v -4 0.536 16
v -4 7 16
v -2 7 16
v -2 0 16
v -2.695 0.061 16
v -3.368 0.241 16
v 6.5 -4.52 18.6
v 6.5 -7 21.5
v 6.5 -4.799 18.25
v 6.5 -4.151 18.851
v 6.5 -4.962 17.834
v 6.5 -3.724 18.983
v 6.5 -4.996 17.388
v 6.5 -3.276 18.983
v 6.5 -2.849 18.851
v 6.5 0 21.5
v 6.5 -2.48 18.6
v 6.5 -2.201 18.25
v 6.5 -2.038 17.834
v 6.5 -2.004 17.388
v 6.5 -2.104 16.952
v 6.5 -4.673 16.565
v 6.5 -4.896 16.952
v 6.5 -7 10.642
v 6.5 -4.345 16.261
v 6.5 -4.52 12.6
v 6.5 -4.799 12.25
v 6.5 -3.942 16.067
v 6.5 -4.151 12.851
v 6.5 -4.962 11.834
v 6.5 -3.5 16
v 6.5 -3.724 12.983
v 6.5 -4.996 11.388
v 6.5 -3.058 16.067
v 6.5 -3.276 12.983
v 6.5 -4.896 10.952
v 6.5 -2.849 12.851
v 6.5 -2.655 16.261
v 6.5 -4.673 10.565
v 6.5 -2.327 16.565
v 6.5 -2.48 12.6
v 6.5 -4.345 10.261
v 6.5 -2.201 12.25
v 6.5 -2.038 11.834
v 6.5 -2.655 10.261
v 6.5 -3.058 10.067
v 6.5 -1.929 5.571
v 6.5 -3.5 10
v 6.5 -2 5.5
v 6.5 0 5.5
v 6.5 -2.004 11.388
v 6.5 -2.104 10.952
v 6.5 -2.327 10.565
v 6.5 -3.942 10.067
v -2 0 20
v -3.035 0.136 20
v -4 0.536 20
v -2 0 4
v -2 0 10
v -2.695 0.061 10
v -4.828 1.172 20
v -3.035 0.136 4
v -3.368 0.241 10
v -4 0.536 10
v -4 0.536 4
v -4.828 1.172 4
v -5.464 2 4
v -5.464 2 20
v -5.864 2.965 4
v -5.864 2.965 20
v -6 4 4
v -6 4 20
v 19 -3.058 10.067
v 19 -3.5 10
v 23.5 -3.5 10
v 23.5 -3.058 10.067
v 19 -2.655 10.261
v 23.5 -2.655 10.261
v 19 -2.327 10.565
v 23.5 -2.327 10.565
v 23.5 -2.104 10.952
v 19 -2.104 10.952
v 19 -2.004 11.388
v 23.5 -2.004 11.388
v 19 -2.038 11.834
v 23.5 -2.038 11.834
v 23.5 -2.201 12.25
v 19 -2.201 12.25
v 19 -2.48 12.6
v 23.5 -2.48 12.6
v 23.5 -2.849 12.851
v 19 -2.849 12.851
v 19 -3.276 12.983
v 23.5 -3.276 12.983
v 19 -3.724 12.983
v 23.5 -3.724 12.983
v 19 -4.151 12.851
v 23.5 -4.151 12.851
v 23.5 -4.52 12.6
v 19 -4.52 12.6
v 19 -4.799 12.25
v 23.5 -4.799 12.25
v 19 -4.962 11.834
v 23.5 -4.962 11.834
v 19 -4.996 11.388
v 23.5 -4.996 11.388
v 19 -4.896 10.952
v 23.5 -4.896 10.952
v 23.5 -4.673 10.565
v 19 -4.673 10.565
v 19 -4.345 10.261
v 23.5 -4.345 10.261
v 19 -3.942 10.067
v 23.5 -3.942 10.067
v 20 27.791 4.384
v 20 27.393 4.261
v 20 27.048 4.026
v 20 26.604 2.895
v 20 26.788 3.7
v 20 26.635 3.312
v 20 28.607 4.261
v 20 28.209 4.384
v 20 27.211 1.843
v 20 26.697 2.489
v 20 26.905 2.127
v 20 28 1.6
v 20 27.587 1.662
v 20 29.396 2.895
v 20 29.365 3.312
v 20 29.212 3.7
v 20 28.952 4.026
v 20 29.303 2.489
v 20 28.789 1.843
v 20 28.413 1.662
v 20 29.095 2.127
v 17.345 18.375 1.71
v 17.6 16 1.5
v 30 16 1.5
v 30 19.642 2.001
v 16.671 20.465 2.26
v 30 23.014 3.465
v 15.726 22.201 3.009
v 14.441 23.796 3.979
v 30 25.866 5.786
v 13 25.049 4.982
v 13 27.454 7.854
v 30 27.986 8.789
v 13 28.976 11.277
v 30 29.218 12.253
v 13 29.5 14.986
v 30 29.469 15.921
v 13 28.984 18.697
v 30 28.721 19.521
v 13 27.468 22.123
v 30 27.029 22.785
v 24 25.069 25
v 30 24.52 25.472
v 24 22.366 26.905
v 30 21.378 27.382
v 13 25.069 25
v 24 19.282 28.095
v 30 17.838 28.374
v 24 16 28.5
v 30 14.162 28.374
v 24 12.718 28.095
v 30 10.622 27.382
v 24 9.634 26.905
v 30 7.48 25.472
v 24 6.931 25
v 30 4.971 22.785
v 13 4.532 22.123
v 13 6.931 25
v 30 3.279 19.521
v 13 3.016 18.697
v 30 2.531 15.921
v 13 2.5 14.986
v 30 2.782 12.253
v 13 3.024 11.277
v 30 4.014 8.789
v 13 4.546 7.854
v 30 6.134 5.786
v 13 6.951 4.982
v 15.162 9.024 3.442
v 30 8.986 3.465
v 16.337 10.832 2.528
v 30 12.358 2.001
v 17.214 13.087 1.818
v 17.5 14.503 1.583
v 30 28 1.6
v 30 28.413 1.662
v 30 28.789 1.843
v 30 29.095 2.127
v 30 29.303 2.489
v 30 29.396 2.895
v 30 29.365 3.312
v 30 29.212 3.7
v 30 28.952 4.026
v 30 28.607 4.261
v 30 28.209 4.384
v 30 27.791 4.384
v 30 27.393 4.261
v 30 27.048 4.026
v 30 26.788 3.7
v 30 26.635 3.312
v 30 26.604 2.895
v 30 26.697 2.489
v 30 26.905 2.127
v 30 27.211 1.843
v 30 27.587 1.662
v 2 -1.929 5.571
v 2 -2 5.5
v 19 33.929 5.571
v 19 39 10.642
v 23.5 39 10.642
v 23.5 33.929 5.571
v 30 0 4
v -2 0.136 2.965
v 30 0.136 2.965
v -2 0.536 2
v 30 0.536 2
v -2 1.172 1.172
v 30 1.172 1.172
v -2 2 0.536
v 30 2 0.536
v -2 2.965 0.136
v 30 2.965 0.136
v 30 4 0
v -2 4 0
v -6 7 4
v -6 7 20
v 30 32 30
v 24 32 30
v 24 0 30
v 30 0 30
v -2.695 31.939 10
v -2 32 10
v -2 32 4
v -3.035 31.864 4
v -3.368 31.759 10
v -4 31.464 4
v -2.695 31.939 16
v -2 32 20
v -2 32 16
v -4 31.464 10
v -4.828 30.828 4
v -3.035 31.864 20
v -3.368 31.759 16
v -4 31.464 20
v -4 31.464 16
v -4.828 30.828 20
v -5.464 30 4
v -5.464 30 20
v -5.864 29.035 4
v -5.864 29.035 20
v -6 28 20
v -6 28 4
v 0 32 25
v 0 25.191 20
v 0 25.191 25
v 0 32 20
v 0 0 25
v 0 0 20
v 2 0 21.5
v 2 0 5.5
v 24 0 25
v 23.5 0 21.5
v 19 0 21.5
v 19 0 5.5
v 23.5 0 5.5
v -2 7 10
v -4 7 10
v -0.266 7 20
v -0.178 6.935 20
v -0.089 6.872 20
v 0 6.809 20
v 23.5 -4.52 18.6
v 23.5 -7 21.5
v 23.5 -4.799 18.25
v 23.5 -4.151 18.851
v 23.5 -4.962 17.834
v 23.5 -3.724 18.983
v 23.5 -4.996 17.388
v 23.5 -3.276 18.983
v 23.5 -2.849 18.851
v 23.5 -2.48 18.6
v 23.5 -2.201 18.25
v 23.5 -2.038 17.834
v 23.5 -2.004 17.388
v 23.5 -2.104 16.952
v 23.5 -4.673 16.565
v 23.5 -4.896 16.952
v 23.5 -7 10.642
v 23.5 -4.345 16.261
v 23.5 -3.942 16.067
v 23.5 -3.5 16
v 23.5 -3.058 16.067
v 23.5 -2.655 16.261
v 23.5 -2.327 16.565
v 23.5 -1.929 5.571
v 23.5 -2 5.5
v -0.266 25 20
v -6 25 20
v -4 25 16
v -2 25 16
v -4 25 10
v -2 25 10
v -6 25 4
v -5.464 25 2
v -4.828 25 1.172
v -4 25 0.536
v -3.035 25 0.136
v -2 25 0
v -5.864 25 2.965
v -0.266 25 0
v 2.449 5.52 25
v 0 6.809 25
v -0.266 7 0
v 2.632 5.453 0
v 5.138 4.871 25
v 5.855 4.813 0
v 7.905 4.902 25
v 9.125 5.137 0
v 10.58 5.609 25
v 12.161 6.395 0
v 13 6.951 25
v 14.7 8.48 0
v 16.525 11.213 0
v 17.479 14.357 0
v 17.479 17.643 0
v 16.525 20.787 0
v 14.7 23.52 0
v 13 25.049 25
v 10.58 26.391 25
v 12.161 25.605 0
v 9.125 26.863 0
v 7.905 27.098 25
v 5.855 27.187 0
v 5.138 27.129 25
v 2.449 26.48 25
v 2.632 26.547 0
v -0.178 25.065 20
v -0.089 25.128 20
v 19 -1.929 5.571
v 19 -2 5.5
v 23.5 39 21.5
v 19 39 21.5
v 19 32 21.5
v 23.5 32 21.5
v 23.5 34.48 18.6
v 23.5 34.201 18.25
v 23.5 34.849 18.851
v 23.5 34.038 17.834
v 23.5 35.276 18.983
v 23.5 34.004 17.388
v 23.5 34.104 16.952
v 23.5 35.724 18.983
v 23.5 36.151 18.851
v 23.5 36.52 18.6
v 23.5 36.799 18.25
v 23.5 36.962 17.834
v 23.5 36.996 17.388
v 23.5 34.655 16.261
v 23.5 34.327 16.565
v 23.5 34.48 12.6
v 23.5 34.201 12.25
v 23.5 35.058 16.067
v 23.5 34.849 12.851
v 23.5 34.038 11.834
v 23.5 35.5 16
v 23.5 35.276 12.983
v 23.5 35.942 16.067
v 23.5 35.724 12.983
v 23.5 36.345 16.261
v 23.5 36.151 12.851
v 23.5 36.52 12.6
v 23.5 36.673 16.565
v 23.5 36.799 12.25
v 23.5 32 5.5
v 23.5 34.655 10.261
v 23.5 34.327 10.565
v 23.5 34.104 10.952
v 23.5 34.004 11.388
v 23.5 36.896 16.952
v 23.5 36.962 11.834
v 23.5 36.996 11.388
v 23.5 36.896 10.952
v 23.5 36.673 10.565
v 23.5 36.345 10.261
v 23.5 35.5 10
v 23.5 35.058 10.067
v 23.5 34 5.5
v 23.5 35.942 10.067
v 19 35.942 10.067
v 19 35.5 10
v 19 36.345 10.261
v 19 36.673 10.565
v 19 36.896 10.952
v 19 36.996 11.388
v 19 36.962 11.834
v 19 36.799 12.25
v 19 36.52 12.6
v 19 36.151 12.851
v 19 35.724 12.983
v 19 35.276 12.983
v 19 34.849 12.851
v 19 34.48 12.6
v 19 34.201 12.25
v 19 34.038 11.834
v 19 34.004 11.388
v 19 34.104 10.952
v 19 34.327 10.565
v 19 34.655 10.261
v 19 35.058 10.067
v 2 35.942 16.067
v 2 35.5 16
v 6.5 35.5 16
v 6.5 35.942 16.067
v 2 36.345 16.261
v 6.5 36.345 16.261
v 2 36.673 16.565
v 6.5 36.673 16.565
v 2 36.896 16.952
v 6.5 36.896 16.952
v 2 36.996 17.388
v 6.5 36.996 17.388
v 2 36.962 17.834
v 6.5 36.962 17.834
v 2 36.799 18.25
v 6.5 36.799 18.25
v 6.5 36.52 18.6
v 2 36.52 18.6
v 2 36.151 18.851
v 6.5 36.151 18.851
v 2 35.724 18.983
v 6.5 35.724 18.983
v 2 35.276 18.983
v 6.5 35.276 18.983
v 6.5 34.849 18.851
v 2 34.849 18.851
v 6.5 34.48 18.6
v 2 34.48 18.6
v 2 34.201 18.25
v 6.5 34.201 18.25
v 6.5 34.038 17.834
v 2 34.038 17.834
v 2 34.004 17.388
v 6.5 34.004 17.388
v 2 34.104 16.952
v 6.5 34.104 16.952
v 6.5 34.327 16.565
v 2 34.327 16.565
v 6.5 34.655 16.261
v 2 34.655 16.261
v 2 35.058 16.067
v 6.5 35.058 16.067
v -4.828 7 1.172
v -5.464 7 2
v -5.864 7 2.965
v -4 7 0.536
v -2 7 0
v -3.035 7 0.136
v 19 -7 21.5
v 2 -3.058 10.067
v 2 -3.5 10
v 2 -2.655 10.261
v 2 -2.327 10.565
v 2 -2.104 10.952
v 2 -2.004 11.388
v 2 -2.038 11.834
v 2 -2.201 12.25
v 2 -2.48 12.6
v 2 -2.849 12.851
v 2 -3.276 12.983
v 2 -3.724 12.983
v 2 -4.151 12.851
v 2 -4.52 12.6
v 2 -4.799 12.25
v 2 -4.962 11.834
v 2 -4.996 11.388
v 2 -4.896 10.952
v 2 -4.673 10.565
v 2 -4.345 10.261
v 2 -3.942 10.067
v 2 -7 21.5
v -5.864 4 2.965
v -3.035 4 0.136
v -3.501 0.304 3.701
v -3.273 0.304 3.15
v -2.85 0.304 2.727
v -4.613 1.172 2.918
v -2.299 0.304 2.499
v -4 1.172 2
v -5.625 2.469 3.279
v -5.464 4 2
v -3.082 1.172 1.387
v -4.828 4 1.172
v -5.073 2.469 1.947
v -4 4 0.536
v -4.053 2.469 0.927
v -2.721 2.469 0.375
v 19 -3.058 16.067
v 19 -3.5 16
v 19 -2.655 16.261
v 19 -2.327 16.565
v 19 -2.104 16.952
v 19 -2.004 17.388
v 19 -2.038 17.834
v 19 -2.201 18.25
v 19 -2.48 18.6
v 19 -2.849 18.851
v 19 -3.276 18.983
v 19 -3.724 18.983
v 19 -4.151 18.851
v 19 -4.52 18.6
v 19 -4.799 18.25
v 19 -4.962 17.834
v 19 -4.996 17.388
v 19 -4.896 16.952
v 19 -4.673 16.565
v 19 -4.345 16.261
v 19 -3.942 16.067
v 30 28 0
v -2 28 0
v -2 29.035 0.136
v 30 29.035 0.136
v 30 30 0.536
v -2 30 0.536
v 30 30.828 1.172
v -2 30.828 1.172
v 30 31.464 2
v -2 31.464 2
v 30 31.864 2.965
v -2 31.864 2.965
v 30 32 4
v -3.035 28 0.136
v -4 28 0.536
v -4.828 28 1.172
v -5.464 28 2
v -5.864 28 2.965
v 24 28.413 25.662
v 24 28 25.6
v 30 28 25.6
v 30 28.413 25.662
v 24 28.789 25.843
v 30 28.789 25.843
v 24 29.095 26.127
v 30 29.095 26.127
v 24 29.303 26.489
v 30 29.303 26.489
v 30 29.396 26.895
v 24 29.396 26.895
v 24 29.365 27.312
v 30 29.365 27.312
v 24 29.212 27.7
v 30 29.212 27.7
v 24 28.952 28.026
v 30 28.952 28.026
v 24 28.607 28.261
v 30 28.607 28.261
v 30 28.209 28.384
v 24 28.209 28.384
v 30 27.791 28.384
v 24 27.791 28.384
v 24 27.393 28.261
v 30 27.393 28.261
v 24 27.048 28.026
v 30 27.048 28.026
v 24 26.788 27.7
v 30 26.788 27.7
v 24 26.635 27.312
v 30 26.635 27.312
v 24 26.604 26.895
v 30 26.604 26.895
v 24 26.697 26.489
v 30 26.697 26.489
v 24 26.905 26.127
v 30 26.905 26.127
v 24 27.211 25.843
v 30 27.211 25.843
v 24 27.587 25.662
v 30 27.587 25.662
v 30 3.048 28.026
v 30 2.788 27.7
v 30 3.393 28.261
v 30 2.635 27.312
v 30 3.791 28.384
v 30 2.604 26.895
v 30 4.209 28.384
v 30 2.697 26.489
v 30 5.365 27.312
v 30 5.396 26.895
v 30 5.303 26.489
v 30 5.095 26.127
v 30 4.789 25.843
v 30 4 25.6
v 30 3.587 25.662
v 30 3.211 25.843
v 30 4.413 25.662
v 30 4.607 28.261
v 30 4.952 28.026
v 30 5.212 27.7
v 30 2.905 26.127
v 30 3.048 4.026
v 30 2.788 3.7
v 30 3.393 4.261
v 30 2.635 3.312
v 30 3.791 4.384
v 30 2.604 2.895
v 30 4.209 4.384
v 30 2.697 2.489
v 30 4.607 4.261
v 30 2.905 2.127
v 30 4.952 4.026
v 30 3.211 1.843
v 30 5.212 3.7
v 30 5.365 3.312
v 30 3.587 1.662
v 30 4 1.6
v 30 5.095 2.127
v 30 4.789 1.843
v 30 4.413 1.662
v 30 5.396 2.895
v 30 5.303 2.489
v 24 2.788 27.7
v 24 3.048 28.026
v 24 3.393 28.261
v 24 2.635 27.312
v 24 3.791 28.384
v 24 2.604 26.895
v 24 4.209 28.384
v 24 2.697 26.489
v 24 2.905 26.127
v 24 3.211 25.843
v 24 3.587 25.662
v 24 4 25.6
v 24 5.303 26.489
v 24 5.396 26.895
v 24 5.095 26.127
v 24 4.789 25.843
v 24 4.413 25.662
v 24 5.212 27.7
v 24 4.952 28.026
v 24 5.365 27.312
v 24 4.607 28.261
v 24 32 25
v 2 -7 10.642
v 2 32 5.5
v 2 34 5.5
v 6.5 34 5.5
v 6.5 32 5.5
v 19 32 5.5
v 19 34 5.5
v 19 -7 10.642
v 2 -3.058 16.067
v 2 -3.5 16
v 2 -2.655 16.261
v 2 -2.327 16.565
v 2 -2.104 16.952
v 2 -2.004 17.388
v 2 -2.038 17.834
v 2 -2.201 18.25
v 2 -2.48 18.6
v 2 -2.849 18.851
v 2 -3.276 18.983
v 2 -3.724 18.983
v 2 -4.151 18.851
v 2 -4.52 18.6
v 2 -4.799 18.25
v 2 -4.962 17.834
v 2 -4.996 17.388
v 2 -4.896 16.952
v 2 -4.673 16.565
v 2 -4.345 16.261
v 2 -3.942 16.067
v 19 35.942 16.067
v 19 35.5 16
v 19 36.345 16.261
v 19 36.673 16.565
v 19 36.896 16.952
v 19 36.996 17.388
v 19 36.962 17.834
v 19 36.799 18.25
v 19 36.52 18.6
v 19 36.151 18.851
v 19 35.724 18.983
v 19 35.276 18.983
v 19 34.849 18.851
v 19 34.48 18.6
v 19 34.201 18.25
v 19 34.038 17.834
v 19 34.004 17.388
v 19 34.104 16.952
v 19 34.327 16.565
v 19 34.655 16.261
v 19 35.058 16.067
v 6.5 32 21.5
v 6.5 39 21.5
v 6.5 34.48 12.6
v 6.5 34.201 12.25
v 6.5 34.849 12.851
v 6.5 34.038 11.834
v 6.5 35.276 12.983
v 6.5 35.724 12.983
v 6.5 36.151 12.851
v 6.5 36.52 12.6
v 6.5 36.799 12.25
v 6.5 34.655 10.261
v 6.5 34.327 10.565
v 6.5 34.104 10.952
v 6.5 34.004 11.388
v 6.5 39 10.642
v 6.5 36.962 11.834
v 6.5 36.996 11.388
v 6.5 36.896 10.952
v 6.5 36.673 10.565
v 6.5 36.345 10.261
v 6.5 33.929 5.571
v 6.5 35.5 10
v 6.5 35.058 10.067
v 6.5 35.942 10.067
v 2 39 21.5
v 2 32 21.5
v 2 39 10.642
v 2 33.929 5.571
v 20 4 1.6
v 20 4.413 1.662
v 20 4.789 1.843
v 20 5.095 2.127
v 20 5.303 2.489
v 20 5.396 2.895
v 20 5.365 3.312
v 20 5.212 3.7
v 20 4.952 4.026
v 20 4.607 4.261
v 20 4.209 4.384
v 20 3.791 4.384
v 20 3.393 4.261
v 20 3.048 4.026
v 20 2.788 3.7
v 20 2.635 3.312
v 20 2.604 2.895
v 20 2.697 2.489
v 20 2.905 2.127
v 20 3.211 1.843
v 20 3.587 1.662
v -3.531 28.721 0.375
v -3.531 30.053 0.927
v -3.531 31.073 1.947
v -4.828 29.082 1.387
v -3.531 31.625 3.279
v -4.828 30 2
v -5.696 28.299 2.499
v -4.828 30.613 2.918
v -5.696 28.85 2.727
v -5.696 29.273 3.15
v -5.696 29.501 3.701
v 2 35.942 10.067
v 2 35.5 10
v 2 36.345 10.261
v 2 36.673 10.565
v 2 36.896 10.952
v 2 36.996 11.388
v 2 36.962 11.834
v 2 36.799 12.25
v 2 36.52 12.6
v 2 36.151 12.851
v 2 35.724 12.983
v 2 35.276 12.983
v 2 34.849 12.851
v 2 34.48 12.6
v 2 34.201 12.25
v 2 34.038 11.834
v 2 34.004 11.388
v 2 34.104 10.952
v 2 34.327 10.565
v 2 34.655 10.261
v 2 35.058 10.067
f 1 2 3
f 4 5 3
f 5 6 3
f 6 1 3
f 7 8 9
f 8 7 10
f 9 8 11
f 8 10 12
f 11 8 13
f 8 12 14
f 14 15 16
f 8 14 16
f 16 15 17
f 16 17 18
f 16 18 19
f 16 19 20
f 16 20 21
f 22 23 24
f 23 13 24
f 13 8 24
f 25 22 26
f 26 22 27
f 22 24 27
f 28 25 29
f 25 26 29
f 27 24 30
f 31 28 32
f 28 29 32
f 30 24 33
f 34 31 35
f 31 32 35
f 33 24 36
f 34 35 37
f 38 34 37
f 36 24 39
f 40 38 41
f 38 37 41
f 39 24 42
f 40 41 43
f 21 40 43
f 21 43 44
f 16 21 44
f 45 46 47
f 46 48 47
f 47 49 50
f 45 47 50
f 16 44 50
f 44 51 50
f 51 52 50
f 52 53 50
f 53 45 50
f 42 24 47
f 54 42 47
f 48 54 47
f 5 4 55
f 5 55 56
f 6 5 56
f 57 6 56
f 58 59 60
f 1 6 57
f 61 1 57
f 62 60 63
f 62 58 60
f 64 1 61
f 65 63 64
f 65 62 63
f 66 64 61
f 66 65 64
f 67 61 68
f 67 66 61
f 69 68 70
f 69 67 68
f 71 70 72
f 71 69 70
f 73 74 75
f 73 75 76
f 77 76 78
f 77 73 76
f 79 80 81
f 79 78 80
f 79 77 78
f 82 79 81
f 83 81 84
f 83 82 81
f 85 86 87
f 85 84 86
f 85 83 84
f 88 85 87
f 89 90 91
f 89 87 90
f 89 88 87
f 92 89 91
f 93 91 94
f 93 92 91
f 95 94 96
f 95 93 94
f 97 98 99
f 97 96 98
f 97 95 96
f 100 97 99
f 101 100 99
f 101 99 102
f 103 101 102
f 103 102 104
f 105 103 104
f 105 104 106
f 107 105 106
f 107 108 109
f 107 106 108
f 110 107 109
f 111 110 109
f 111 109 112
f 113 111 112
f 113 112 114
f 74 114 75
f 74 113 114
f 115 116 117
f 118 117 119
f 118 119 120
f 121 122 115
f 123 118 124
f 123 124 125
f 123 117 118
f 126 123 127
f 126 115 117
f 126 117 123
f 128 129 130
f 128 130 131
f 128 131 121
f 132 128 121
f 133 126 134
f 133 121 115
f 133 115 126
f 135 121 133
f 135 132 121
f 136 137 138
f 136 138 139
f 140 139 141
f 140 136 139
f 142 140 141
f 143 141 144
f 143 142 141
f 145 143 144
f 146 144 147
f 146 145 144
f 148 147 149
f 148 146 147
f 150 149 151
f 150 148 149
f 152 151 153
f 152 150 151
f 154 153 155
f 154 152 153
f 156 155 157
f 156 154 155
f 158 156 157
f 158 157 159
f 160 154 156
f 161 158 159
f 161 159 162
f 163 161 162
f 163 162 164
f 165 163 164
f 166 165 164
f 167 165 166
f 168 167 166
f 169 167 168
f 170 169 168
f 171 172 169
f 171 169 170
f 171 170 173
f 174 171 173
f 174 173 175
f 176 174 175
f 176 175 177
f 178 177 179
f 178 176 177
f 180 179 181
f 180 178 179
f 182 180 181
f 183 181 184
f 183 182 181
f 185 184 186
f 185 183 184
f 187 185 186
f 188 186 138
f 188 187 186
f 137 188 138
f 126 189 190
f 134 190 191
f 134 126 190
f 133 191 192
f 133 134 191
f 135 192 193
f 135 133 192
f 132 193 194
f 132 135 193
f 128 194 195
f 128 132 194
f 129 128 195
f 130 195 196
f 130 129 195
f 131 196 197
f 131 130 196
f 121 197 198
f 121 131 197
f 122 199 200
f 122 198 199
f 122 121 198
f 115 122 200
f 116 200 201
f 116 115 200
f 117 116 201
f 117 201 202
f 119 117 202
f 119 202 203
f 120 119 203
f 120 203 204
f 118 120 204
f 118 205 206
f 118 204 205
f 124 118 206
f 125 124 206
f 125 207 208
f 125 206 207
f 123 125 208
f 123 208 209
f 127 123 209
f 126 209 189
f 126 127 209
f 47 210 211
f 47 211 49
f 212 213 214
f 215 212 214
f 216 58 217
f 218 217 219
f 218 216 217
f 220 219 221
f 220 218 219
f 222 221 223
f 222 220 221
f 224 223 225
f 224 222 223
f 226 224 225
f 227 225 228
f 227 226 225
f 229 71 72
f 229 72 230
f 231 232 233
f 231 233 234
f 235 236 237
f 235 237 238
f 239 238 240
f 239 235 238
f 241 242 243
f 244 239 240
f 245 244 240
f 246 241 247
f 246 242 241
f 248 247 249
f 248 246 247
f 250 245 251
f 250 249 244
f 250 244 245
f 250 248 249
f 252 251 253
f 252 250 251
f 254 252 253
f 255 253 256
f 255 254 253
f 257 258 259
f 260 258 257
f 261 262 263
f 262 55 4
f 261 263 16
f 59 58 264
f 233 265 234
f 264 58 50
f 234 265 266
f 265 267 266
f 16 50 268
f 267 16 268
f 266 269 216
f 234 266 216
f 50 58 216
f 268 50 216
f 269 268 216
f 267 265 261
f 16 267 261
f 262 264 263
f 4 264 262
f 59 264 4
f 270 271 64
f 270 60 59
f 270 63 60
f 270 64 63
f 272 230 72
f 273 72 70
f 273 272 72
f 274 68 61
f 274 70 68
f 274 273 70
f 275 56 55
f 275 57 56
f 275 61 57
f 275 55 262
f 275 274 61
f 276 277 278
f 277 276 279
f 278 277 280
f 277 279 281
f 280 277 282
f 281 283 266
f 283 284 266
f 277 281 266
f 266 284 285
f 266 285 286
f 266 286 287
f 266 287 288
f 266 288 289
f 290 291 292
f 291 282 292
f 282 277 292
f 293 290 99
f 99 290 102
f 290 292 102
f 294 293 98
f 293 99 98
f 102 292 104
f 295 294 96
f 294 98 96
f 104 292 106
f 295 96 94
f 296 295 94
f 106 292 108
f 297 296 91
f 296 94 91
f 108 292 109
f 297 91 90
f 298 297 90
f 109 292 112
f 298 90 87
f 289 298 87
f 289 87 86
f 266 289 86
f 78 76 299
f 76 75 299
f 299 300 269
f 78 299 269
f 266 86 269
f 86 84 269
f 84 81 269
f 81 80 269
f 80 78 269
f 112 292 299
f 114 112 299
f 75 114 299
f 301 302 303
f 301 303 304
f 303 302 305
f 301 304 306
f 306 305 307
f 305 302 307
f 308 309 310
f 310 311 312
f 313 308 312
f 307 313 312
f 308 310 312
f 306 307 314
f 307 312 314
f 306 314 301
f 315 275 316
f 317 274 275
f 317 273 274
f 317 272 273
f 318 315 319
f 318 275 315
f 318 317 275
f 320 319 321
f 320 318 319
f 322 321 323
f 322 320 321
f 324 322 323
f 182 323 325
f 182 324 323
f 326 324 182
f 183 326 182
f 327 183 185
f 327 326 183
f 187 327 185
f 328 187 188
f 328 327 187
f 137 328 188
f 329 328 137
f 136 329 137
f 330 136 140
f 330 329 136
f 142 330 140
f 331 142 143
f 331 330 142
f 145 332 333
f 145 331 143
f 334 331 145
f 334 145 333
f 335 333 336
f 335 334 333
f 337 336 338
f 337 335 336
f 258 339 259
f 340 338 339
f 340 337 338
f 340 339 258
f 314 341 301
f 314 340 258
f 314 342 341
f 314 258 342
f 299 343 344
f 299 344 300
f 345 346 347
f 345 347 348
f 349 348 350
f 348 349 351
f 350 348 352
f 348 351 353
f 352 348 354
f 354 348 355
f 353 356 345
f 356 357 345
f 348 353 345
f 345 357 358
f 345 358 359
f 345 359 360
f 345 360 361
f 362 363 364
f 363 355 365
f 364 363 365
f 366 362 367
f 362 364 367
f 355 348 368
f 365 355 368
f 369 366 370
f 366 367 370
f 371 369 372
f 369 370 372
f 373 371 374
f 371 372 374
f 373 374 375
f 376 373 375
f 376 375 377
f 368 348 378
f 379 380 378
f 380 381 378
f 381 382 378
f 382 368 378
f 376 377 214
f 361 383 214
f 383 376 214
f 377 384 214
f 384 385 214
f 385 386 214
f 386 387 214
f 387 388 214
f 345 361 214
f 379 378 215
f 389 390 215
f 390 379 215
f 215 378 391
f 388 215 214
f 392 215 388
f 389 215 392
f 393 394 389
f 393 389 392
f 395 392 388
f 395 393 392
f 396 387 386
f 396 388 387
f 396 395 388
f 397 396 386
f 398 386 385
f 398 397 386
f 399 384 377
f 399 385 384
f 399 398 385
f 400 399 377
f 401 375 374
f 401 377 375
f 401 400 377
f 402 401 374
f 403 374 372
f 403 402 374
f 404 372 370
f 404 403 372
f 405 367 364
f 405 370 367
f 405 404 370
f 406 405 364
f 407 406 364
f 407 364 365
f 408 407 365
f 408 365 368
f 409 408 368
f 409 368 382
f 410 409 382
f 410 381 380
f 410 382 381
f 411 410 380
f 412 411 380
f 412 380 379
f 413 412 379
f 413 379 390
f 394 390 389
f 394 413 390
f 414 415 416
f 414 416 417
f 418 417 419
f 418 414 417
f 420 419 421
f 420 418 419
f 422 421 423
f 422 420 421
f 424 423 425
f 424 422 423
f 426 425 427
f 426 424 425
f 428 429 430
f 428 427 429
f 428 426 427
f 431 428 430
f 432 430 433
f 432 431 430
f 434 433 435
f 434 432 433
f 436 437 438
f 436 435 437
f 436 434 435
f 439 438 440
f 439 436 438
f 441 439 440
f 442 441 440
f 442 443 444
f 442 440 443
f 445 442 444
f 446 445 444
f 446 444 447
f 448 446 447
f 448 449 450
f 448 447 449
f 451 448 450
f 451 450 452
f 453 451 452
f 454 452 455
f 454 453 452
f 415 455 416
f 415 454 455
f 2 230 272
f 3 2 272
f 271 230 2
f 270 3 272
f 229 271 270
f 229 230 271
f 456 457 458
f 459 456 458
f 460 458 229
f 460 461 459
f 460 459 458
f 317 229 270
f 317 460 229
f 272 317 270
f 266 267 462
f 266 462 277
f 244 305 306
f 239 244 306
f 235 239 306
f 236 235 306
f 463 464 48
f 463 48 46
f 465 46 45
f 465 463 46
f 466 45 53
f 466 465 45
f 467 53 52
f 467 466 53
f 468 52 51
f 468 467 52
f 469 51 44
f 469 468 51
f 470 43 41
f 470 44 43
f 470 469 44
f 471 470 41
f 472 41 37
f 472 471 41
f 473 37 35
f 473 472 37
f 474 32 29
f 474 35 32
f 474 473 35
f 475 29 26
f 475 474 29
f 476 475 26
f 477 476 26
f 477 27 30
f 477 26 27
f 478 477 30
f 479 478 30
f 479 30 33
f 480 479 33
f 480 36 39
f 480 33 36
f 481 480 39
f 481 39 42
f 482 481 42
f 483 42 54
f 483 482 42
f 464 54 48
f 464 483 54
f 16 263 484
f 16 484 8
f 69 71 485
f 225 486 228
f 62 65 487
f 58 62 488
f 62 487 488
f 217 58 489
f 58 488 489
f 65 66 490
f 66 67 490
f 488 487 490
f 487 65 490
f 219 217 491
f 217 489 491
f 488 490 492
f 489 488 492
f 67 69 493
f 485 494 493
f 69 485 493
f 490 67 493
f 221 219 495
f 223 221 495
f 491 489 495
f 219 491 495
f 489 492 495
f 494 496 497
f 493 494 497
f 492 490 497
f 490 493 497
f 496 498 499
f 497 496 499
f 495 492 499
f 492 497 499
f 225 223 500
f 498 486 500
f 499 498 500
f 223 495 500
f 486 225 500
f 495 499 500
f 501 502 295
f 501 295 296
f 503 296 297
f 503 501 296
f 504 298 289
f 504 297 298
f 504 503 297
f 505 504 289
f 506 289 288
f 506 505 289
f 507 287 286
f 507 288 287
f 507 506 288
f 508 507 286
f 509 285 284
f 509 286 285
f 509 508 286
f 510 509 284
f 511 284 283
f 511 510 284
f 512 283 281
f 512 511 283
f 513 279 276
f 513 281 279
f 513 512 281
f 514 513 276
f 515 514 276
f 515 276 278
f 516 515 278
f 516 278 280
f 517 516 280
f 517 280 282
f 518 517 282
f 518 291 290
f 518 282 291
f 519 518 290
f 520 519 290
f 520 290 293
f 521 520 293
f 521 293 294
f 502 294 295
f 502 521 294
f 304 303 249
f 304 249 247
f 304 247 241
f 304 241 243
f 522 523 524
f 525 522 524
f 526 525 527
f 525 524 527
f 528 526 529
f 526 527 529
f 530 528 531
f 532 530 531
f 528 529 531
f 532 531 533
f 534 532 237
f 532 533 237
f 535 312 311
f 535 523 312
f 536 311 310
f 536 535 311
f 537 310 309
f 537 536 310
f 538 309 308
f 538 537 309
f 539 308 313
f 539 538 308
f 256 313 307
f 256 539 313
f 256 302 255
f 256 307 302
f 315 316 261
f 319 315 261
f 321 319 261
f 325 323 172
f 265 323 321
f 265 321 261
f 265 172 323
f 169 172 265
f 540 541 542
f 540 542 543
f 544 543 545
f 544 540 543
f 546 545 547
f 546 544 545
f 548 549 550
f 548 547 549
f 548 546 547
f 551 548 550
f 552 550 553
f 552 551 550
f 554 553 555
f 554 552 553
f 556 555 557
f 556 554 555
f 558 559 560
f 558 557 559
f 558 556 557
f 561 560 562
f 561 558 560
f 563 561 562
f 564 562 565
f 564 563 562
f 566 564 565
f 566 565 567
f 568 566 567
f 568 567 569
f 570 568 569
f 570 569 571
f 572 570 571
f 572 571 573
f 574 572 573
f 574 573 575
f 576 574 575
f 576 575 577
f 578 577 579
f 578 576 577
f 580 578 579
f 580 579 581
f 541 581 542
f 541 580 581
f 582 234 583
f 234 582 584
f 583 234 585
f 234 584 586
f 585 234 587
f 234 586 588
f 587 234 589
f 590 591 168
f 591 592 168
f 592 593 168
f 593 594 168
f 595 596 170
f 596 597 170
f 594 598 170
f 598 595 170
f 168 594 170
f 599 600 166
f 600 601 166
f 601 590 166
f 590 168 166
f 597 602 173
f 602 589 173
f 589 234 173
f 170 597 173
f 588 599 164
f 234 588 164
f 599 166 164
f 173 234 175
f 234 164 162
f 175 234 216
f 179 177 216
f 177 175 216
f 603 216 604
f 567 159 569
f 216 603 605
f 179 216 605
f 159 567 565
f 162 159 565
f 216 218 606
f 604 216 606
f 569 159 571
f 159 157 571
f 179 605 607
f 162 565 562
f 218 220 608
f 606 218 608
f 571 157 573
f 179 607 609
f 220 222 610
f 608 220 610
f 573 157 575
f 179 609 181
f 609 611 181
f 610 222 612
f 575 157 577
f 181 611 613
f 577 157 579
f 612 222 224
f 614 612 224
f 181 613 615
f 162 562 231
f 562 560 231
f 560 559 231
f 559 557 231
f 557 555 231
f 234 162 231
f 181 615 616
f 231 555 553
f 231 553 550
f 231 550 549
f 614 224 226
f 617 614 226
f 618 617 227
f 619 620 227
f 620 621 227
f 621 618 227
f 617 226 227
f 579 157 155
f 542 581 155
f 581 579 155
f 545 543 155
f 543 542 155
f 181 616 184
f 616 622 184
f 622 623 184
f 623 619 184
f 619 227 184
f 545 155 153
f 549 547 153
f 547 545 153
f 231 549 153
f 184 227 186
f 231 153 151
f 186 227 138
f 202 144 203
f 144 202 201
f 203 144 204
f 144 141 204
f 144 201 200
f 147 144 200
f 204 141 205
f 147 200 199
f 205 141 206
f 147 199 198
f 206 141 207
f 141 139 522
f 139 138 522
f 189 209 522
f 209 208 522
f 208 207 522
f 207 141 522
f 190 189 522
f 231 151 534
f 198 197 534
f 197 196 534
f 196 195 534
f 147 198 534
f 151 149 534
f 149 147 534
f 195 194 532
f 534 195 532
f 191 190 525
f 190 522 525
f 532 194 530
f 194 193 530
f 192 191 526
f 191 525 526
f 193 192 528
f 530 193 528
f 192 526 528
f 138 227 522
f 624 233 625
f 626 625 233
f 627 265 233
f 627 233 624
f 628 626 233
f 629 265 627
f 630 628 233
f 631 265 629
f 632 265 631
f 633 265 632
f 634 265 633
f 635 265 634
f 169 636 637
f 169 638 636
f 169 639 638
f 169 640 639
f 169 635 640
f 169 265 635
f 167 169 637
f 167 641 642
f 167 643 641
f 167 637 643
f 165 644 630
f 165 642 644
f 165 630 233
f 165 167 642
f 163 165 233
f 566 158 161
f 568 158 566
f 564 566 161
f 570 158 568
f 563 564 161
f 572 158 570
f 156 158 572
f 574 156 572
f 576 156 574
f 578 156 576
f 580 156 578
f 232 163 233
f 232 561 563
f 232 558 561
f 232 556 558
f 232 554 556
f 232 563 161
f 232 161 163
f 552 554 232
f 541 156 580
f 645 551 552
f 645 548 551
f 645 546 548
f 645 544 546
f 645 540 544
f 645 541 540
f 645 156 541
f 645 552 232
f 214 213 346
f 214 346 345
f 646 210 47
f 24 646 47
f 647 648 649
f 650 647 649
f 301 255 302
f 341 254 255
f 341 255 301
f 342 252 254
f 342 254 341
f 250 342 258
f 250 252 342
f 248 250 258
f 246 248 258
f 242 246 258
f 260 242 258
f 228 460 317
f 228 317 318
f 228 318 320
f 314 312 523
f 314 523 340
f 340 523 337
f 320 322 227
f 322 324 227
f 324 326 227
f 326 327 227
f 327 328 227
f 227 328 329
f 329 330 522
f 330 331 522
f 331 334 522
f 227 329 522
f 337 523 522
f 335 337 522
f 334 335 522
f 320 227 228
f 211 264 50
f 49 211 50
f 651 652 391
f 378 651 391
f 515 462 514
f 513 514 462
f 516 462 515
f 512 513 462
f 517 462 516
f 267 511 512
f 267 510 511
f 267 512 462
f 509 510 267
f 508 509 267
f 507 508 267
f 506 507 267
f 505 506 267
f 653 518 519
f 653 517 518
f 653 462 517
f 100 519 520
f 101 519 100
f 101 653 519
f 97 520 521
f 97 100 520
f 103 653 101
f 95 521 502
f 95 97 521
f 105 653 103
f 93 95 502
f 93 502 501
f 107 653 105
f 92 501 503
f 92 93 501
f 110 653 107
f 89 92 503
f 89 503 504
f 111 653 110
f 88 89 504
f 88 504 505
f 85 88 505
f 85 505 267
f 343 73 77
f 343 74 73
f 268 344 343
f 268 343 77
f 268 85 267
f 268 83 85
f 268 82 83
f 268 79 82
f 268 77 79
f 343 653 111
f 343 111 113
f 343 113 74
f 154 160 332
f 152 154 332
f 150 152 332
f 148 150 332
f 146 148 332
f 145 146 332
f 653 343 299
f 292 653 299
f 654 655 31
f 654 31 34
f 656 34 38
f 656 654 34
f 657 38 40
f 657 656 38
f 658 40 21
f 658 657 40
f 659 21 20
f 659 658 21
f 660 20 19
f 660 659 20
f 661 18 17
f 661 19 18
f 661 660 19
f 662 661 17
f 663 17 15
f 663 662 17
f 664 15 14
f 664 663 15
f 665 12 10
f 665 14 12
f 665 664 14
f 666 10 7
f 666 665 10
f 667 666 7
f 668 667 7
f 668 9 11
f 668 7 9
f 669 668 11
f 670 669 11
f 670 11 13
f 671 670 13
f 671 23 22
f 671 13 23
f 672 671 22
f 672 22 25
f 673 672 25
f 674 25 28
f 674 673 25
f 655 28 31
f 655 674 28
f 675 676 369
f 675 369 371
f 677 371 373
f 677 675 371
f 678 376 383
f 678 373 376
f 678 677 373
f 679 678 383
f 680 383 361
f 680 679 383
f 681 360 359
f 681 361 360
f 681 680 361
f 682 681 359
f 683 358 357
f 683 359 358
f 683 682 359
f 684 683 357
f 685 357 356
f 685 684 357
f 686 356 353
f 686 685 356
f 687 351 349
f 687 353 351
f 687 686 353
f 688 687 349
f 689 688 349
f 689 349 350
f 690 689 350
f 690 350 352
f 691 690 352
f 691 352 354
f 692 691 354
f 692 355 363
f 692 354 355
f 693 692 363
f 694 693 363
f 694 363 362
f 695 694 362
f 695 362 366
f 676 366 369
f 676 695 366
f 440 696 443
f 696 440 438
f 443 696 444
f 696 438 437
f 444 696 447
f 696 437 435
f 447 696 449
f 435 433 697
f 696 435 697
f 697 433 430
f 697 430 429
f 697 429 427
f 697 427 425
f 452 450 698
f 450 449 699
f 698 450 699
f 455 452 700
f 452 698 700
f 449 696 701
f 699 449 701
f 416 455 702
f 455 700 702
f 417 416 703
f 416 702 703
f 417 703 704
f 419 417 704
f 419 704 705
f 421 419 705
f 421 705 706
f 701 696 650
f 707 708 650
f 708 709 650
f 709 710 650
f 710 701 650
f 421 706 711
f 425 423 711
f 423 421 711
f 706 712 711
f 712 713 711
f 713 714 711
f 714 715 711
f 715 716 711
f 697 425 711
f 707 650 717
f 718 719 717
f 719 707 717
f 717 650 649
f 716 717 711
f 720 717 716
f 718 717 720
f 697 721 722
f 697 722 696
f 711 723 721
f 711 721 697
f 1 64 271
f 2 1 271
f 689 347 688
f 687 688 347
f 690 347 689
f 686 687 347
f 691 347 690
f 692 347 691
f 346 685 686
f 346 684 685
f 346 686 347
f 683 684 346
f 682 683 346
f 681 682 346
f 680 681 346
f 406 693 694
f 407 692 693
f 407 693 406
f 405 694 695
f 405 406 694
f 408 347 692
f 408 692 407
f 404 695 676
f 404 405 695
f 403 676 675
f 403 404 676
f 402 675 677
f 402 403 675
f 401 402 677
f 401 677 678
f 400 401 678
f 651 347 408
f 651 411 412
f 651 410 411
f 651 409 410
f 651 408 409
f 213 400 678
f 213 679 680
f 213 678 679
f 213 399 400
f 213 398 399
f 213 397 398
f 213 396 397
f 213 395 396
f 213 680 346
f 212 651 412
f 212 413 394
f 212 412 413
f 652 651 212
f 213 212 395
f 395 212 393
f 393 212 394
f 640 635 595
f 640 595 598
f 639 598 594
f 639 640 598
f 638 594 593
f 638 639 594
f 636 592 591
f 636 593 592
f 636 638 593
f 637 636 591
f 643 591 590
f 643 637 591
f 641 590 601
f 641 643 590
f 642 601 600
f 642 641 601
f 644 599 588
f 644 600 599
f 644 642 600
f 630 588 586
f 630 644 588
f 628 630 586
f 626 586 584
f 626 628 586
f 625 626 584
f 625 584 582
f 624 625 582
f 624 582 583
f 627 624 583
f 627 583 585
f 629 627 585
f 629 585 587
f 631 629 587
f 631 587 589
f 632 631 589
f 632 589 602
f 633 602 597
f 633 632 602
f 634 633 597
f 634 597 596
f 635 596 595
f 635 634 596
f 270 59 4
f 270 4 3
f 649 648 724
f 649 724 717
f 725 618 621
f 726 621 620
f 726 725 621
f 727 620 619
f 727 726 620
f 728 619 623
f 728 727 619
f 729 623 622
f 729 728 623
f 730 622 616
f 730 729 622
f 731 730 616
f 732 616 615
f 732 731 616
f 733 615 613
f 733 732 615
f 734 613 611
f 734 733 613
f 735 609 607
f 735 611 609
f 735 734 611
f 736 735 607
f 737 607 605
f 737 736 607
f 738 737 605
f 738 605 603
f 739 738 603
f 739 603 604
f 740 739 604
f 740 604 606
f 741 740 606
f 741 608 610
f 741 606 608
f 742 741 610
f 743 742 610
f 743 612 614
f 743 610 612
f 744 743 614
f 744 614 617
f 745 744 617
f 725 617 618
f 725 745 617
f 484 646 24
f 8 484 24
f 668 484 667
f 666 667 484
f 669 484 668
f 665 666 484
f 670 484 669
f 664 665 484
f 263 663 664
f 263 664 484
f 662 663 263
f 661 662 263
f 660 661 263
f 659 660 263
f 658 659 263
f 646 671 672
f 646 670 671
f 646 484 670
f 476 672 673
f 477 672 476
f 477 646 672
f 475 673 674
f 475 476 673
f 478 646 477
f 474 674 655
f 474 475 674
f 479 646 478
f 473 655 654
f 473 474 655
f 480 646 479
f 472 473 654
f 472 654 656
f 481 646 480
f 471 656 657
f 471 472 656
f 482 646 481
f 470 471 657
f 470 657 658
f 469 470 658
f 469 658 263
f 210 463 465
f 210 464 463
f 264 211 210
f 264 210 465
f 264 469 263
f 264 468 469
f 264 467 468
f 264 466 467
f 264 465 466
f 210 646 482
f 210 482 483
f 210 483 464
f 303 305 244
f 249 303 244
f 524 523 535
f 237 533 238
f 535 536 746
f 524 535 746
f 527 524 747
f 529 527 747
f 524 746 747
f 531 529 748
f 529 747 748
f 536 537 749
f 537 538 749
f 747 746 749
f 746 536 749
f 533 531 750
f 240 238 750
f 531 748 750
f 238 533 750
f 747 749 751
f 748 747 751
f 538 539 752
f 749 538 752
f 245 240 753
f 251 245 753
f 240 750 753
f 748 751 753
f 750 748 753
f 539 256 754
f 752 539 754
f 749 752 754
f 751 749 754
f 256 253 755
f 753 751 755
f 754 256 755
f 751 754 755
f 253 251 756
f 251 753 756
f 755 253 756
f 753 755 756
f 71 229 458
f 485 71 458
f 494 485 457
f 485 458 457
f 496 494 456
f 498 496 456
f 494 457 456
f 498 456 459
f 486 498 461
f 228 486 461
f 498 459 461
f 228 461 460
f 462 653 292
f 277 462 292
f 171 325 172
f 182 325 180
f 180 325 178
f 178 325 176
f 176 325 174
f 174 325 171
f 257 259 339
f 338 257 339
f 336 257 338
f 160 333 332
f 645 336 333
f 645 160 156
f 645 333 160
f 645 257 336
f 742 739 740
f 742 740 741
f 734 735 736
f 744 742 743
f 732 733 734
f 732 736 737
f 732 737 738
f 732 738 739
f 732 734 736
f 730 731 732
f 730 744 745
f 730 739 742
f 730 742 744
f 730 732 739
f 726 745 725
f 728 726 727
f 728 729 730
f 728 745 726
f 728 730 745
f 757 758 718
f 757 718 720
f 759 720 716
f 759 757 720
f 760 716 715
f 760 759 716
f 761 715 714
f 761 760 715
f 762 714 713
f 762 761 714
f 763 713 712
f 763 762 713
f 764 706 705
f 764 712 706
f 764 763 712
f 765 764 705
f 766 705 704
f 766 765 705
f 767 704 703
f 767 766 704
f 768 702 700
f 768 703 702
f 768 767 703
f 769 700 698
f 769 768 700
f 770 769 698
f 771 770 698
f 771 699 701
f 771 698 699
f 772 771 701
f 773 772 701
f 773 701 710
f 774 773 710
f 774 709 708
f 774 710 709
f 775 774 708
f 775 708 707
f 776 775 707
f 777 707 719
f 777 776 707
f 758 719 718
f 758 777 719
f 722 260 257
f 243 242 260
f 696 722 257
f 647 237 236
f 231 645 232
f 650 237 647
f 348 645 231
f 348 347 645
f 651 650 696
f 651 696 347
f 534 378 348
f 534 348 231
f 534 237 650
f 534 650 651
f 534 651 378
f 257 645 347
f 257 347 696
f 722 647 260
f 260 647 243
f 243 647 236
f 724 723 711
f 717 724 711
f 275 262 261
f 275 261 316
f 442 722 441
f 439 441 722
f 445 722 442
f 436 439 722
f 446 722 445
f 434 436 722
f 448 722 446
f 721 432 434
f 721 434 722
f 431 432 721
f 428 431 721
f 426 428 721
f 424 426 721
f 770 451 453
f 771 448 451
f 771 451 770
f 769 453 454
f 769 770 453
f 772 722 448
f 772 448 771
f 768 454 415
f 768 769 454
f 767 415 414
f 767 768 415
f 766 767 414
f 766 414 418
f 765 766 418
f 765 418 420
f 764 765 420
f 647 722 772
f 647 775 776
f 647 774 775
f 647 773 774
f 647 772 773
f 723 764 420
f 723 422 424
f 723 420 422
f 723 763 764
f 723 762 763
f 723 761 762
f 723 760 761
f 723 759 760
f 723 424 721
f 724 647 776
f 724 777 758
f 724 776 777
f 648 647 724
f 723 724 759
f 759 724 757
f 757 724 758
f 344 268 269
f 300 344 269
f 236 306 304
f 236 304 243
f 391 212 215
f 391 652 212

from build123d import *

# Parameters (mm, degrees)
BOX010_W                = 22
BOX010_H                = 10
BOX010_DEPTH            = 10
BOX010_ROLL_ANGLE       = 45
BOX009_W                = 22
BOX009_H                = 10
BOX009_DEPTH            = 10
BOX009_ROLL_ANGLE       = 45
CYLINDER010_R           = 1.5
CYLINDER010_DEPTH       = 40
CYLINDER010_PITCH_ANGLE = 90
CYLINDER011_R           = 1.5
CYLINDER011_DEPTH       = 40
CYLINDER011_PITCH_ANGLE = 90
CYLINDER012_R           = 1.5
CYLINDER012_DEPTH       = 40
CYLINDER012_PITCH_ANGLE = 90
CYLINDER009_R           = 1.5
CYLINDER009_DEPTH       = 40
CYLINDER009_PITCH_ANGLE = 90
BOX004_W                = 2
BOX004_H                = 32
BOX004_DEPTH            = 6
CYLINDER_R              = 11.2
CYLINDER_DEPTH          = 25
CYLINDER001_R           = 13.5
CYLINDER001_DEPTH       = 18
CYLINDER001_PITCH_ANGLE = 90
CYLINDER003_R           = 1.4
CYLINDER003_DEPTH       = 20
CYLINDER003_PITCH_ANGLE = 90
CYLINDER005_R           = 1.4
CYLINDER005_DEPTH       = 20
CYLINDER005_PITCH_ANGLE = 90
CYLINDER004_R           = 1.4
CYLINDER004_DEPTH       = 20
CYLINDER004_PITCH_ANGLE = 90
CYLINDER002_R           = 1.4
CYLINDER002_DEPTH       = 20
CYLINDER002_PITCH_ANGLE = 90
BOX002_W                = 6
BOX002_H                = 7
BOX002_DEPTH            = 20
BOX006_W                = 4.5
BOX006_H                = 7
BOX006_DEPTH            = 16
BOX007_W                = 4.5
BOX007_H                = 7
BOX007_DEPTH            = 16
BOX008_W                = 4.5
BOX008_H                = 7
BOX008_DEPTH            = 16
BOX005_W                = 4.5
BOX005_H                = 7
BOX005_DEPTH            = 16
BOX003_W                = 6
BOX003_H                = 7
BOX003_DEPTH            = 20
BOX001_W                = 6
BOX001_H                = 32
BOX001_DEPTH            = 30
BOX_W                   = 24
BOX_H                   = 32
BOX_DEPTH               = 25
FILLET_R                = 4
FILLET001_R             = 4
FILLET002_R             = 4
FILLET003_R             = 4


with BuildPart() as cube010:
    # Box010 → Box010 (new body)
    with BuildSketch(Plane.XY):
        with Locations((11, 5)):
            Rectangle(BOX010_W, BOX010_H)
    extrude(amount=BOX010_DEPTH)


with BuildPart() as cube010_1:
    # Box010 roll: moved
    add(cube010.part.rotate(Axis((0, 0, 0), (1, 0, 0)), BOX010_ROLL_ANGLE))


with BuildPart() as cube010_2:
    # Box010 placement: moved
    add(cube010_1.part.moved(Location((2, 41, -7))))


with BuildPart() as fusionwingcuts:
    # Box009 → Box009 (new body)
    with BuildSketch(Plane.XY):
        with Locations((11, 5)):
            Rectangle(BOX009_W, BOX009_H)
    extrude(amount=BOX009_DEPTH)


with BuildPart() as fusionwingcuts_1:
    # Box009 roll: moved
    add(fusionwingcuts.part.rotate(Axis((0, 0, 0), (1, 0, 0)), BOX009_ROLL_ANGLE))


with BuildPart() as fusionwingcuts_2:
    # Box009 placement: moved
    add(fusionwingcuts_1.part.moved(Location((2, -9, -7))))

    # Fusion005: union Cube010
    add(cube010_2.part)


with BuildPart() as fusionwingcuts_3:
    # Fusion005 placement: moved
    add(fusionwingcuts_2.part.moved(Location((0, 0, 5.5))))


with BuildPart() as cylinder010:
    # Cylinder010 → Cylinder010 (new body)
    with BuildSketch(Plane.XY):
        Circle(CYLINDER010_R)
    extrude(amount=CYLINDER010_DEPTH)


with BuildPart() as cylinder010_1:
    # Cylinder010 pitch: moved
    add(cylinder010.part.rotate(Axis((0, 0, 0), (0, 1, 0)), CYLINDER010_PITCH_ANGLE))


with BuildPart() as cylinder010_2:
    # Cylinder010 placement: moved
    add(cylinder010_1.part.moved(Location((0, -3.5, 6))))


with BuildPart() as cylinder011:
    # Cylinder011 → Cylinder011 (new body)
    with BuildSketch(Plane.XY):
        Circle(CYLINDER011_R)
    extrude(amount=CYLINDER011_DEPTH)


with BuildPart() as cylinder011_1:
    # Cylinder011 pitch: moved
    add(cylinder011.part.rotate(Axis((0, 0, 0), (0, 1, 0)), CYLINDER011_PITCH_ANGLE))


with BuildPart() as cylinder011_2:
    # Cylinder011 placement: moved
    add(cylinder011_1.part.moved(Location((0, 35.5, 12))))


with BuildPart() as cylinder012:
    # Cylinder012 → Cylinder012 (new body)
    with BuildSketch(Plane.XY):
        Circle(CYLINDER012_R)
    extrude(amount=CYLINDER012_DEPTH)


with BuildPart() as cylinder012_1:
    # Cylinder012 pitch: moved
    add(cylinder012.part.rotate(Axis((0, 0, 0), (0, 1, 0)), CYLINDER012_PITCH_ANGLE))


with BuildPart() as cylinder012_2:
    # Cylinder012 placement: moved
    add(cylinder012_1.part.moved(Location((0, 35.5, 6))))


with BuildPart() as fusionwingscrews:
    # Cylinder009 → Cylinder009 (new body)
    with BuildSketch(Plane.XY):
        Circle(CYLINDER009_R)
    extrude(amount=CYLINDER009_DEPTH)


with BuildPart() as fusionwingscrews_1:
    # Cylinder009 pitch: moved
    add(fusionwingscrews.part.rotate(Axis((0, 0, 0), (0, 1, 0)), CYLINDER009_PITCH_ANGLE))


with BuildPart() as fusionwingscrews_2:
    # Cylinder009 placement: moved
    add(fusionwingscrews_1.part.moved(Location((0, -3.5, 12))))

    # Fusion004: union Cylinder010, Cylinder011, Cylinder012
    add(cylinder010_2.part)
    add(cylinder011_2.part)
    add(cylinder012_2.part)


with BuildPart() as fusionwingscrews_3:
    # Fusion004 placement: moved
    add(fusionwingscrews_2.part.moved(Location((0, 0, 5.5))))


with BuildPart() as cubeziptiehor:
    # Box004 → Box004 (new body)
    with BuildSketch(Plane(origin=(-4, 0, 10), x_dir=(1, 0, 0), z_dir=(0, 0, 1))):
        with Locations((1, 16)):
            Rectangle(BOX004_W, BOX004_H)
    extrude(amount=BOX004_DEPTH)


with BuildPart() as cylinderheatsink:
    # Cylinder → Cylinder (new body)
    with BuildSketch(Plane(origin=(6.4, 16, 0), x_dir=(1, 0, 0), z_dir=(0, 0, 1))):
        Circle(CYLINDER_R)
    extrude(amount=CYLINDER_DEPTH)


with BuildPart() as cylinderfan:
    # Cylinder001 → Cylinder001 (new body)
    with BuildSketch(Plane.XY):
        Circle(CYLINDER001_R)
    extrude(amount=CYLINDER001_DEPTH)


with BuildPart() as cylinderfan_1:
    # Cylinder001 pitch: moved
    add(cylinderfan.part.rotate(Axis((0, 0, 0), (0, 1, 0)), CYLINDER001_PITCH_ANGLE))


with BuildPart() as cylinderfan_2:
    # Cylinder001 placement: moved
    add(cylinderfan_1.part.moved(Location((13, 16, 15))))


with BuildPart() as cylindertl:
    # Cylinder003 → Cylinder003 (new body)
    with BuildSketch(Plane.XY):
        Circle(CYLINDER003_R)
    extrude(amount=CYLINDER003_DEPTH)


with BuildPart() as cylindertl_1:
    # Cylinder003 pitch: moved
    add(cylindertl.part.rotate(Axis((0, 0, 0), (0, 1, 0)), CYLINDER003_PITCH_ANGLE))


with BuildPart() as cylindertl_2:
    # Cylinder003 placement: moved
    add(cylindertl_1.part.moved(Location((20, 4, 27))))


with BuildPart() as cylinderrb:
    # Cylinder005 → Cylinder005 (new body)
    with BuildSketch(Plane.XY):
        Circle(CYLINDER005_R)
    extrude(amount=CYLINDER005_DEPTH)


with BuildPart() as cylinderrb_1:
    # Cylinder005 pitch: moved
    add(cylinderrb.part.rotate(Axis((0, 0, 0), (0, 1, 0)), CYLINDER005_PITCH_ANGLE))


with BuildPart() as cylinderrb_2:
    # Cylinder005 placement: moved
    add(cylinderrb_1.part.moved(Location((20, 28, 3))))


with BuildPart() as cylindertb:
    # Cylinder004 → Cylinder004 (new body)
    with BuildSketch(Plane.XY):
        Circle(CYLINDER004_R)
    extrude(amount=CYLINDER004_DEPTH)


with BuildPart() as cylindertb_1:
    # Cylinder004 pitch: moved
    add(cylindertb.part.rotate(Axis((0, 0, 0), (0, 1, 0)), CYLINDER004_PITCH_ANGLE))


with BuildPart() as cylindertb_2:
    # Cylinder004 placement: moved
    add(cylindertb_1.part.moved(Location((20, 28, 27))))


with BuildPart() as fusioncuts:
    # Cylinder002 → Cylinder002 (new body)
    with BuildSketch(Plane.XY):
        Circle(CYLINDER002_R)
    extrude(amount=CYLINDER002_DEPTH)


with BuildPart() as fusioncuts_1:
    # Cylinder002 pitch: moved
    add(fusioncuts.part.rotate(Axis((0, 0, 0), (0, 1, 0)), CYLINDER002_PITCH_ANGLE))


with BuildPart() as fusioncuts_2:
    # Cylinder002 placement: moved
    add(fusioncuts_1.part.moved(Location((20, 4, 3))))

    # Fusion001: union CylinderTL, CylinderRB, CylinderTB
    add(cylindertl_2.part)
    add(cylinderrb_2.part)
    add(cylindertb_2.part)

    # Fusion: union FusionWingCuts, FusionWingScrews, CubeZipTieHor, CylinderHeatSink, CylinderFan
    add(fusionwingcuts_3.part)
    add(fusionwingscrews_3.part)
    add(cubeziptiehor.part)
    add(cylinderheatsink.part)
    add(cylinderfan_2.part)


with BuildPart() as cubeziptiel:
    # Box002 → Box002 (new body)
    with BuildSketch(Plane(origin=(-6, 0, 0), x_dir=(1, 0, 0), z_dir=(0, 0, 1))):
        with Locations((3, 3.5)):
            Rectangle(BOX002_W, BOX002_H)
    extrude(amount=BOX002_DEPTH)


with BuildPart() as cube006:
    # Box006 → Box006 (new body)
    with BuildSketch(Plane(origin=(19, -7, 0), x_dir=(1, 0, 0), z_dir=(0, 0, 1))):
        with Locations((2.25, 3.5)):
            Rectangle(BOX006_W, BOX006_H)
    extrude(amount=BOX006_DEPTH)


with BuildPart() as cube007:
    # Box007 → Box007 (new body)
    with BuildSketch(Plane(origin=(2, 32, 0), x_dir=(1, 0, 0), z_dir=(0, 0, 1))):
        with Locations((2.25, 3.5)):
            Rectangle(BOX007_W, BOX007_H)
    extrude(amount=BOX007_DEPTH)


with BuildPart() as cube008:
    # Box008 → Box008 (new body)
    with BuildSketch(Plane(origin=(19, 32, 0), x_dir=(1, 0, 0), z_dir=(0, 0, 1))):
        with Locations((2.25, 3.5)):
            Rectangle(BOX008_W, BOX008_H)
    extrude(amount=BOX008_DEPTH)


with BuildPart() as fusionwings:
    # Box005 → Box005 (new body)
    with BuildSketch(Plane(origin=(2, -7, 0), x_dir=(1, 0, 0), z_dir=(0, 0, 1))):
        with Locations((2.25, 3.5)):
            Rectangle(BOX005_W, BOX005_H)
    extrude(amount=BOX005_DEPTH)

    # Fusion006: union Cube006, Cube007, Cube008
    add(cube006.part)
    add(cube007.part)
    add(cube008.part)


with BuildPart() as fusionwings_1:
    # Fusion006 placement: moved
    add(fusionwings.part.moved(Location((0, 0, 5.5))))


with BuildPart() as cubziptier:
    # Box003 → Box003 (new body)
    with BuildSketch(Plane(origin=(-6, 25, 0), x_dir=(1, 0, 0), z_dir=(0, 0, 1))):
        with Locations((3, 3.5)):
            Rectangle(BOX003_W, BOX003_H)
    extrude(amount=BOX003_DEPTH)


with BuildPart() as cubefrontmask:
    # Box001 → Box001 (new body)
    with BuildSketch(Plane(origin=(24, 0, 0), x_dir=(1, 0, 0), z_dir=(0, 0, 1))):
        with Locations((3, 16)):
            Rectangle(BOX001_W, BOX001_H)
    extrude(amount=BOX001_DEPTH)


with BuildPart() as cute3dv6:
    # Box → Box (new body)
    with BuildSketch(Plane.XY):
        with Locations((12, 16)):
            Rectangle(BOX_W, BOX_H)
    extrude(amount=BOX_DEPTH)

    # Fusion007: union CubeZipTieL, FusionWings, CubZipTieR, CubeFrontMask
    add(cubeziptiel.part)
    add(fusionwings_1.part)
    add(cubziptier.part)
    add(cubefrontmask.part)

    # Fillet
    fillet_edges = [cute3dv6.edges().sort_by_distance(p)[0] for p in [
        (-6, 3.5, 0),
    ]]
    fillet(fillet_edges, radius=FILLET_R)

    # Fillet001
    fillet001_edges = [cute3dv6.edges().sort_by_distance(p)[0] for p in [
        (12, 0, 0),
    ]]
    fillet(fillet001_edges, radius=FILLET001_R)

    # Fillet002
    fillet002_edges = [cute3dv6.edges().sort_by_distance(p)[0] for p in [
        (12, 32, 0),
    ]]
    fillet(fillet002_edges, radius=FILLET002_R)

    # Fillet003
    fillet003_edges = [cute3dv6.edges().sort_by_distance(p)[0] for p in [
        (-6, 26.5, 0),
    ]]
    fillet(fillet003_edges, radius=FILLET003_R)

    # Cut: cut FusionCUTS
    add(fusioncuts_2.part, mode=Mode.SUBTRACT)


solid = cute3dv6.part
